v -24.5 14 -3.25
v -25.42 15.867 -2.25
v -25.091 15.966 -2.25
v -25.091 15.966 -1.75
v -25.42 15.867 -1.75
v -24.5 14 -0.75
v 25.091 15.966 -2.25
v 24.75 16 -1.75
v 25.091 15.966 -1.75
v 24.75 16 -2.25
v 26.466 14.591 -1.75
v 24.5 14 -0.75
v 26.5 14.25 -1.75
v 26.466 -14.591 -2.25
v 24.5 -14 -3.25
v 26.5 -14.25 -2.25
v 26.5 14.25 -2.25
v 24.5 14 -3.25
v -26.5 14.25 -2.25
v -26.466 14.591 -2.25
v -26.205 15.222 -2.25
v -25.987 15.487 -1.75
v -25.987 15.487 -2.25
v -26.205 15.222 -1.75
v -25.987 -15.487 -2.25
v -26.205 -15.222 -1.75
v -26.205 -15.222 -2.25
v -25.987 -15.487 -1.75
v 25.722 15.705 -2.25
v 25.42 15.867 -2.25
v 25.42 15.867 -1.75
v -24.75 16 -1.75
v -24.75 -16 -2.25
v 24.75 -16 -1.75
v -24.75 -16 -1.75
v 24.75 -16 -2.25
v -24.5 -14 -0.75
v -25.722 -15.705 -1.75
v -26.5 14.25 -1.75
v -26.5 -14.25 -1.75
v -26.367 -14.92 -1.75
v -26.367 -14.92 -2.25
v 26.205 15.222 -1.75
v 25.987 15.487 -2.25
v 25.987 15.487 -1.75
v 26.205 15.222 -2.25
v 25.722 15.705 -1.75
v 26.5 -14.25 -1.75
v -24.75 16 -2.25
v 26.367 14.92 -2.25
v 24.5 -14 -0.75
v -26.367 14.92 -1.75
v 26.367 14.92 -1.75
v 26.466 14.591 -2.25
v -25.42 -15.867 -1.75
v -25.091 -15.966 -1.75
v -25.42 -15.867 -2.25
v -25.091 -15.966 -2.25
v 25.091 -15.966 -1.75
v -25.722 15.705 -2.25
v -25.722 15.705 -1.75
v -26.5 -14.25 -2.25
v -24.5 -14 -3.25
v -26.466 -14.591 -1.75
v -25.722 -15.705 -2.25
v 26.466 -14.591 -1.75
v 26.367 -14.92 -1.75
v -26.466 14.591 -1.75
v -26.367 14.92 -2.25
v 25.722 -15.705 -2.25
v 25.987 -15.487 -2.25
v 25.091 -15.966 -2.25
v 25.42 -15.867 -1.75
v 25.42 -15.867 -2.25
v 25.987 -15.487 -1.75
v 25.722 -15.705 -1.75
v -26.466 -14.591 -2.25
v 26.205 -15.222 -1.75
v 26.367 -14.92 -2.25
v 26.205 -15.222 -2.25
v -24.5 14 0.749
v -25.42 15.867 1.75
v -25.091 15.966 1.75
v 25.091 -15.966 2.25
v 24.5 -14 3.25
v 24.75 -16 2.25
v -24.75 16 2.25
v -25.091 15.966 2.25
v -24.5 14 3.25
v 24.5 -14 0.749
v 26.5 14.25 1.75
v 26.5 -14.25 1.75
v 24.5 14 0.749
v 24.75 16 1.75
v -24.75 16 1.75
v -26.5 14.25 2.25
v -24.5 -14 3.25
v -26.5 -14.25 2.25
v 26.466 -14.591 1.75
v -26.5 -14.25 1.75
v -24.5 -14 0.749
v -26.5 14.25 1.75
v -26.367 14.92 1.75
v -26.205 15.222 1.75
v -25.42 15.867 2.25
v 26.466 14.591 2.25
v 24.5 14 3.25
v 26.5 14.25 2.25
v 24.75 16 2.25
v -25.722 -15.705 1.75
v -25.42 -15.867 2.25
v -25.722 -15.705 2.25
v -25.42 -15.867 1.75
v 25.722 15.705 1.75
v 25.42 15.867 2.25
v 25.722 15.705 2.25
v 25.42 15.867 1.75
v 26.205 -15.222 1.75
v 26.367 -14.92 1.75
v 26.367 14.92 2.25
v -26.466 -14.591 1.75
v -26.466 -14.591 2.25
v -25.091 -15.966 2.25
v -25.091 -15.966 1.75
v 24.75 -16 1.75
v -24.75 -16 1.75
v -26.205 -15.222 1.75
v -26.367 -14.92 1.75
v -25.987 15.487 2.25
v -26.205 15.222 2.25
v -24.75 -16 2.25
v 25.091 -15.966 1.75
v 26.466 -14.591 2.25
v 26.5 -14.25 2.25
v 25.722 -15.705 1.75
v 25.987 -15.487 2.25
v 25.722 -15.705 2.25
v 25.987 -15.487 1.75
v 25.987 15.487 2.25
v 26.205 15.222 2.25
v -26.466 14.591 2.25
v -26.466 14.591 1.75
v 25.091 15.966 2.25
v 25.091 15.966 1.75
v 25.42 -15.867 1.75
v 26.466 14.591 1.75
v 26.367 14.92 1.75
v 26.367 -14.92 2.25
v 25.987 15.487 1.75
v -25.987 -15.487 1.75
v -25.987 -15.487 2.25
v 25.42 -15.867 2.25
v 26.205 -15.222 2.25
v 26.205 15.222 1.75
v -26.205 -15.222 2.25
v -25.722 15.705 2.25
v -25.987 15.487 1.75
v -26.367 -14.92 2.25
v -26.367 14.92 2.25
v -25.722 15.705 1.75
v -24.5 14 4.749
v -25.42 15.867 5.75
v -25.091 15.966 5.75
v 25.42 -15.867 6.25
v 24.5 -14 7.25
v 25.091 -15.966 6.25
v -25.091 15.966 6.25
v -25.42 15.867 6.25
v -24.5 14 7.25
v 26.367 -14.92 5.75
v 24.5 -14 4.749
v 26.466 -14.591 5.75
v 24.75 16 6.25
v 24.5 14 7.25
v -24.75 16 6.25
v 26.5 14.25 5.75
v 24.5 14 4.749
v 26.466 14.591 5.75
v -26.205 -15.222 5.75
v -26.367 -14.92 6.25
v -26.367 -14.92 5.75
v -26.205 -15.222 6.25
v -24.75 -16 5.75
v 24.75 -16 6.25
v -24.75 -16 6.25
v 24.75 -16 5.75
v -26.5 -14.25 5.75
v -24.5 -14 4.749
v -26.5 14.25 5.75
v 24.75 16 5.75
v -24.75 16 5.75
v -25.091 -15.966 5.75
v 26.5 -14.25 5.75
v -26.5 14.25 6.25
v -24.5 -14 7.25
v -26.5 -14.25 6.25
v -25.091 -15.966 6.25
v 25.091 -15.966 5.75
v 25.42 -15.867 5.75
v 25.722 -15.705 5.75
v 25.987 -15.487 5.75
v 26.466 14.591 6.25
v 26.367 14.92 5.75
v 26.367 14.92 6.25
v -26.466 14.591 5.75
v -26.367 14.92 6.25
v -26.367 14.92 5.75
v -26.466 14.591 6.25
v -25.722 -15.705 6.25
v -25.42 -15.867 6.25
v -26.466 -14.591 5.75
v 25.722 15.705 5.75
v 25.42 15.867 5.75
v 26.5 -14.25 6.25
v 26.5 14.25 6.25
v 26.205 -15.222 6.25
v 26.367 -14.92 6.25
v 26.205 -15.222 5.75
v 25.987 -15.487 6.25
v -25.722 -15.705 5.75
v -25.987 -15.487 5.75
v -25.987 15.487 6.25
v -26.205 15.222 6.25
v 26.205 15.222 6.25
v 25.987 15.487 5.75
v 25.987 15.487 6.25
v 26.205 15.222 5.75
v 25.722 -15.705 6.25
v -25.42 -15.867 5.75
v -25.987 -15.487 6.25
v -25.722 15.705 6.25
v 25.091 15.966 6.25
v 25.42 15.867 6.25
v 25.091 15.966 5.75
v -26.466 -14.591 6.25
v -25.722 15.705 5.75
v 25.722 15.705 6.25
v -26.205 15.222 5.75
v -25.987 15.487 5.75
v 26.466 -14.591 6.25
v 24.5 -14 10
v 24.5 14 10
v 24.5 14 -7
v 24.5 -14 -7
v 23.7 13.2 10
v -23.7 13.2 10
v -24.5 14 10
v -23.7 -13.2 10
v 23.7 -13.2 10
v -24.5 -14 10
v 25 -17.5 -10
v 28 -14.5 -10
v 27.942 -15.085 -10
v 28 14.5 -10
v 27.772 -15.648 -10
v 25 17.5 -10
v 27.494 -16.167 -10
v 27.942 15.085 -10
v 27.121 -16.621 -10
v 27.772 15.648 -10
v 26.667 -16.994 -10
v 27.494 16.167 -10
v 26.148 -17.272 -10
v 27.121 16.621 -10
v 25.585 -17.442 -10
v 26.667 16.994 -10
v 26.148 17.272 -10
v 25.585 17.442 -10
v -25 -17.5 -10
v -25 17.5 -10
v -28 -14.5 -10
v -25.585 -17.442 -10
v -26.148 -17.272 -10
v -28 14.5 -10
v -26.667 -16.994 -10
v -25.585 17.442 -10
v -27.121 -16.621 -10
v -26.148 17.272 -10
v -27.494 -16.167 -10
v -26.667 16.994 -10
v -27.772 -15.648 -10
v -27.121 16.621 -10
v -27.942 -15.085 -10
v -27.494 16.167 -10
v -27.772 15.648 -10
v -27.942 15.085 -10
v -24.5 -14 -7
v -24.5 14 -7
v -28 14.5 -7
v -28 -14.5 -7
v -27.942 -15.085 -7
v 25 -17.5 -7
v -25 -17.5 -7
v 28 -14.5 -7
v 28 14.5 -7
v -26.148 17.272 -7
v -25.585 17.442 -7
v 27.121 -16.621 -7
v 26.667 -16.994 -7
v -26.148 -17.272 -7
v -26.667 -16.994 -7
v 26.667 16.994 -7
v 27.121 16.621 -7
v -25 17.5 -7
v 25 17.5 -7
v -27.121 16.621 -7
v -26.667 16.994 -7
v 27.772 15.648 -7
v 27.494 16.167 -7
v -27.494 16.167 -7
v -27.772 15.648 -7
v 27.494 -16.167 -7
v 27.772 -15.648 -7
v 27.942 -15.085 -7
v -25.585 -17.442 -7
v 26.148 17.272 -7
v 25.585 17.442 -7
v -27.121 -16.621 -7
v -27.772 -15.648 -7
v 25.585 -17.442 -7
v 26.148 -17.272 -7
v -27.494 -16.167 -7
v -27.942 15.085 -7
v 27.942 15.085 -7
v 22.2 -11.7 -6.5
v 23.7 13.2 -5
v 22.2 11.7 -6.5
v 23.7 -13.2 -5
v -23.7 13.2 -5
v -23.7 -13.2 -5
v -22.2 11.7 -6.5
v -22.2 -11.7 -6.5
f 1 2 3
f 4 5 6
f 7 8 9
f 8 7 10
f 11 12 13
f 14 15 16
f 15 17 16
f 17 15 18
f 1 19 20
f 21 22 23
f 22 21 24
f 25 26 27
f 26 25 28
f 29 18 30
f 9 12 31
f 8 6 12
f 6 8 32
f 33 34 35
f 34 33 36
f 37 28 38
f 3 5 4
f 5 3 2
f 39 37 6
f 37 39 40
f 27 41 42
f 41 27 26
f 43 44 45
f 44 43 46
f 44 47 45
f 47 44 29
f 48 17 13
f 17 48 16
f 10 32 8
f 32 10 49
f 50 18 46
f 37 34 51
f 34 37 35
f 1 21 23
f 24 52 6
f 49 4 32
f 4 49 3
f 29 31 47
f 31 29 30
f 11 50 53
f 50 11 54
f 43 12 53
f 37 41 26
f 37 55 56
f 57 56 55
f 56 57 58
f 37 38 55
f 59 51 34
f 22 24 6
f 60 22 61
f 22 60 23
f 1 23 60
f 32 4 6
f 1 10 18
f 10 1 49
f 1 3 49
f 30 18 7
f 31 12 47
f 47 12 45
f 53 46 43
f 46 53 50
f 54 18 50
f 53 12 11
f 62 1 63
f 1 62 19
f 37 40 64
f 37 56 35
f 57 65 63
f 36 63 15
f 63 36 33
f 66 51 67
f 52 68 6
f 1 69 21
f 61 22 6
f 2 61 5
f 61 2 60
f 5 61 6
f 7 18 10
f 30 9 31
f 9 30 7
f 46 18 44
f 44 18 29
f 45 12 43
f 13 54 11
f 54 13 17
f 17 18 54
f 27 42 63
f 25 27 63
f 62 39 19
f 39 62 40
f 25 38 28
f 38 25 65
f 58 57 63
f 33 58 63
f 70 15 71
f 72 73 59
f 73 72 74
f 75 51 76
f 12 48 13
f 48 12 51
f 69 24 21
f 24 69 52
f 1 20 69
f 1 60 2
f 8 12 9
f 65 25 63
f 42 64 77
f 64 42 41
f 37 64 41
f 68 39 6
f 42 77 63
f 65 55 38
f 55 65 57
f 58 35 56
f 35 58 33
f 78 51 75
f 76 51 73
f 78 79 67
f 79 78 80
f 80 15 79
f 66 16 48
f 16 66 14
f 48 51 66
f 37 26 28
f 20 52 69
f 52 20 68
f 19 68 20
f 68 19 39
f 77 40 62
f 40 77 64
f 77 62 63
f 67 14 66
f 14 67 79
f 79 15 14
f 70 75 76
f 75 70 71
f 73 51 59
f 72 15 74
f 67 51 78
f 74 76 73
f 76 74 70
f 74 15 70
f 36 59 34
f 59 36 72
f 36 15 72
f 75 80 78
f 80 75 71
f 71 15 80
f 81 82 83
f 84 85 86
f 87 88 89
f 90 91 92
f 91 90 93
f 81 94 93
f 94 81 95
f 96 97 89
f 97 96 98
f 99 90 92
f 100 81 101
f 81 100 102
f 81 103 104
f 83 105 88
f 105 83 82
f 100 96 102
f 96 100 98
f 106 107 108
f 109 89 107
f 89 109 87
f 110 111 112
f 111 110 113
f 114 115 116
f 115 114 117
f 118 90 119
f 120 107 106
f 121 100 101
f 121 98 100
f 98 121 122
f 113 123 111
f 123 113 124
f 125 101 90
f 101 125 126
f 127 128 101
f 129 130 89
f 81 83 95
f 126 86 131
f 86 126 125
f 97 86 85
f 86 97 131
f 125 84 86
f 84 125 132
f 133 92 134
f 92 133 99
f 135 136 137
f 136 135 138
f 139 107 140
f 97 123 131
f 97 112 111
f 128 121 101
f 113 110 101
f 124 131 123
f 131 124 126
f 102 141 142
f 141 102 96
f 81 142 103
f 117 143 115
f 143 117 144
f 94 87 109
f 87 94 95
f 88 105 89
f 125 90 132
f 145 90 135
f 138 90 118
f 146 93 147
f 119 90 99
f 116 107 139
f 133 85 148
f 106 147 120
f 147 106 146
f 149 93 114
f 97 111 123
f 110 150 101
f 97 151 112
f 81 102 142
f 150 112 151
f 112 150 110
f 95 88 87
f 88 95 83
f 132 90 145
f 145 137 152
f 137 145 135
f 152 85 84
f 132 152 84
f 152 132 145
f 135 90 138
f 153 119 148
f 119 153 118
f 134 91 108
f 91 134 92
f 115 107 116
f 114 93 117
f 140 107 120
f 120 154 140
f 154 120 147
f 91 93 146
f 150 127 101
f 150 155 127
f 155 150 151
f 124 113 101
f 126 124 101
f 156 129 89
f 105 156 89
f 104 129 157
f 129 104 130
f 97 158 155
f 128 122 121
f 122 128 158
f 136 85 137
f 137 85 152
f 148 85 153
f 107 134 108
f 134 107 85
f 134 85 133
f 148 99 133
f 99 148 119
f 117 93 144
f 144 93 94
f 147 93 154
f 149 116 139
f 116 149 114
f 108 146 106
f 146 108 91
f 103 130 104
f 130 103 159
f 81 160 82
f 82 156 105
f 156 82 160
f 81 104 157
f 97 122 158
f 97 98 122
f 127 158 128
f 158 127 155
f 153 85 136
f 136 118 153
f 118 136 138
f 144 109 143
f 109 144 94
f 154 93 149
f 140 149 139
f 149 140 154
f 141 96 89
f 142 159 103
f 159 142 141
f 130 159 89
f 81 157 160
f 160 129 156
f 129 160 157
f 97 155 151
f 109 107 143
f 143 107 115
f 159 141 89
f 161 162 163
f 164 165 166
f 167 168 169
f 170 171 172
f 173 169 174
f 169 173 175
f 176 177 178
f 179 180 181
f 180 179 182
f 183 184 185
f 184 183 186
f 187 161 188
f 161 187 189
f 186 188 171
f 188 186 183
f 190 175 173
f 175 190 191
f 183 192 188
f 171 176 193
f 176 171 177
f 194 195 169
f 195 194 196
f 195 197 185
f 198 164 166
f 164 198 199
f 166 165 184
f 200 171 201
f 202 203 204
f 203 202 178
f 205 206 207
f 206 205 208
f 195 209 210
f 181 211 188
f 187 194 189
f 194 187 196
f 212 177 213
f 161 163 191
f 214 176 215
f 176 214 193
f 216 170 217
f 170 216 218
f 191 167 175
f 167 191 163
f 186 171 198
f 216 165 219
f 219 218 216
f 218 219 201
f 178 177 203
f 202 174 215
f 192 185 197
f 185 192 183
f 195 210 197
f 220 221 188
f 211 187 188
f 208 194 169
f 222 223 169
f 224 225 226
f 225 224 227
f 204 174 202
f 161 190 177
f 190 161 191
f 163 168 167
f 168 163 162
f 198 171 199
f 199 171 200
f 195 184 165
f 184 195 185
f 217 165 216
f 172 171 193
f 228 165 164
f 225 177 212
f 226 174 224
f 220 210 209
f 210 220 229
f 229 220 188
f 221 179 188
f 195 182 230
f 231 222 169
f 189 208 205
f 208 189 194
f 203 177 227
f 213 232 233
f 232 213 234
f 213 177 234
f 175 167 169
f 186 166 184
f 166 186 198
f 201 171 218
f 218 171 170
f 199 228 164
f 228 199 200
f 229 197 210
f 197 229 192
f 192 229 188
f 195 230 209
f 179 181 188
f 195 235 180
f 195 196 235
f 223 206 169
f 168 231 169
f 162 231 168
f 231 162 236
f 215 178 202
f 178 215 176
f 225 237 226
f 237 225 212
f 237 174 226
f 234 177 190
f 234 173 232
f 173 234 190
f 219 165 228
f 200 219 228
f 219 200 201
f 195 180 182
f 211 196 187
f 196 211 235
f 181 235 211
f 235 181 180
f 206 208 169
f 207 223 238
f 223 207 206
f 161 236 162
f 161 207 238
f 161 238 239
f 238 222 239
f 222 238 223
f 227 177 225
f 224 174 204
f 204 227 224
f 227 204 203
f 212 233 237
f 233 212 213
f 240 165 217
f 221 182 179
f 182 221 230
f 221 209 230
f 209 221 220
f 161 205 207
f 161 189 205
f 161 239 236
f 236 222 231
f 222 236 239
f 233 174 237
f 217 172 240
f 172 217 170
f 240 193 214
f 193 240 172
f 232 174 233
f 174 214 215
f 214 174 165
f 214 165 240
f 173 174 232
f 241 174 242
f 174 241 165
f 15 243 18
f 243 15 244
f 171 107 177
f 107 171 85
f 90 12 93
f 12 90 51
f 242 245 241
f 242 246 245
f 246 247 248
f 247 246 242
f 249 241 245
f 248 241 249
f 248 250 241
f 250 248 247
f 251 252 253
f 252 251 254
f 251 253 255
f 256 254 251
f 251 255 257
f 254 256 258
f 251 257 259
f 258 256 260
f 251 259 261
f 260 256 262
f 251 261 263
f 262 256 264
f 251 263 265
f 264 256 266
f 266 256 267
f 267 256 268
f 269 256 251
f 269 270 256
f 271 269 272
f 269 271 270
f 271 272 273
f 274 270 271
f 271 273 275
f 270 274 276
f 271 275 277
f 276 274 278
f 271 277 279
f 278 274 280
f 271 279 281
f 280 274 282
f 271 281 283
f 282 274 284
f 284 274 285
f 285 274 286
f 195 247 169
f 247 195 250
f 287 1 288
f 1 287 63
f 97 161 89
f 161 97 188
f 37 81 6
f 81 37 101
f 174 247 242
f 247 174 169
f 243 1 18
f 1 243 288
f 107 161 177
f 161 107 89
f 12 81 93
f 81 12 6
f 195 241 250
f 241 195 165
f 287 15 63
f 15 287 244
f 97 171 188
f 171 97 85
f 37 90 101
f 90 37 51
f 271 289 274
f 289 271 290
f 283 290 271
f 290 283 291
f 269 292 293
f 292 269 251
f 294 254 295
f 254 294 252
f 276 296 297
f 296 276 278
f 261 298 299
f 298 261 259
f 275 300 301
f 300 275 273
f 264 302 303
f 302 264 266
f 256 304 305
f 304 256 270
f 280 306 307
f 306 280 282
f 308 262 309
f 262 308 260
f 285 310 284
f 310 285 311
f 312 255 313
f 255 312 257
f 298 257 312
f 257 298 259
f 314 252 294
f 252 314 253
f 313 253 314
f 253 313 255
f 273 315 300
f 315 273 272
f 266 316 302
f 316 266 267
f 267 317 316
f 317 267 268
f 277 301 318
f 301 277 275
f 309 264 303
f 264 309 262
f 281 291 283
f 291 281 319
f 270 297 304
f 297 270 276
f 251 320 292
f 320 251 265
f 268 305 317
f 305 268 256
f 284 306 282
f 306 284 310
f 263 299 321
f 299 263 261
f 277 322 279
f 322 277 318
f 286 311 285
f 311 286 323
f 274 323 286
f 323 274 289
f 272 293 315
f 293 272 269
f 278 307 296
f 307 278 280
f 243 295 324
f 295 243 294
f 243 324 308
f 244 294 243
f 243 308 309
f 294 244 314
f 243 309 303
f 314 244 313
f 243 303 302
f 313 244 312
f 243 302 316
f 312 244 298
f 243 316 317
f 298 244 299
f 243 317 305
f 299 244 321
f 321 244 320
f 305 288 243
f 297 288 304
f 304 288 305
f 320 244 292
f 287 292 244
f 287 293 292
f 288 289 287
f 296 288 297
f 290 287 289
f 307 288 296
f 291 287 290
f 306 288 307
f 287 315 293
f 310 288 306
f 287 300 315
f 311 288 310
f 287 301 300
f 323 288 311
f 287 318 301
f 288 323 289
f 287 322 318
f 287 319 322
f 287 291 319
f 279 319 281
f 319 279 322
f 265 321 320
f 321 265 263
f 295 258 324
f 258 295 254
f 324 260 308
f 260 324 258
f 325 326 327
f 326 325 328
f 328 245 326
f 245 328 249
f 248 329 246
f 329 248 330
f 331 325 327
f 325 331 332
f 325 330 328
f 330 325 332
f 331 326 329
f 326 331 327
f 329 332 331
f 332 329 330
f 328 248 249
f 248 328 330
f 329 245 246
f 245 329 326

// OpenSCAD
//Constructs a plug for rectangle-shaped pipes. 
//By Simon Klein

//Outer thickness of the bottom part
bd=3;   
//Outer tube width (=Bottom width)
bw=56;  
//Outer tube height (=Bottom height)
bh=35;  
//Outer radius of the tube edges 
br=3;   
//Total depth
d=20;   
//Wall-thickness
b=0.8;  
//Depth of the lamella
lb=2;   
//Width of the base of the lamella
ld=2.5; 
//Width of the top of the lamella
lf=0.5; 
//Number of lamella
lx=3;   
//Distance of lamella
ll=4;   
//Offset from the bottom
lo=8;   

//wall thickness of pipe (Difference between width of the bottom and the lamella)
ws = 2.5; 

//Inner chamfer on the bottom
bc=1.5; 
//Inner bottom wall thickness
bws=2;  

//Number of facets on round edges
$fn=32; 

w=bw-2*ws-lb;
h=bh-2*ws-lb;
lr=max(0,br-ws/2);
r=max(0,br-ws/2-lb);

difference() {
    union() {
        rCube2D([w,h,d],r);
        translate([0,0,-d/2+bd/2])
            rCube2D([bw,bh,bd],br);
        translate([0,0,-d/2+lo])
            for (i = [1:lx]) {
                translate([0,0,(i-1)*ll])
                    lamella(w,h,lr,lb,ld,lf);
            }
    }
    translate([0,0,bws])
        chamfer([w-2*b,h-2*b,d],max(0,r-b),bc);
}

module lamella(w,h,r,lb,ld,lf) {
    hull() {
        rCube2D([w+2*lb,h+2*lb,lf],max(r,0));
        translate([0,0,ld/2])
            rCube2D([w,h,0.001],max(r-lb,0));
        translate([0,0,-ld/2])
            rCube2D([w,h,0.001],max(r-lb,0));
    }
}

module chamfer(dim,r,bc) {
    translate([0,0,bc])
        hull() {
            translate([0,0,bc])
                rCube2D(dim,max(0,r-b));
            resize([dim[0]-2*bc,dim[1]-2*bc,dim[2]])
                rCube2D(dim,max(0,r-b));
        }
}

module rCube2D(dim, r) {
	if (r>0) {
		minkowski() {
				cube([dim[0]-2*r,dim[1]-2*r,dim[2]/2], center=true);
				cylinder(r=r,h=dim[2]/2, center=true);
		}
	} else {
		cube(dim,center=true);
	}
}
